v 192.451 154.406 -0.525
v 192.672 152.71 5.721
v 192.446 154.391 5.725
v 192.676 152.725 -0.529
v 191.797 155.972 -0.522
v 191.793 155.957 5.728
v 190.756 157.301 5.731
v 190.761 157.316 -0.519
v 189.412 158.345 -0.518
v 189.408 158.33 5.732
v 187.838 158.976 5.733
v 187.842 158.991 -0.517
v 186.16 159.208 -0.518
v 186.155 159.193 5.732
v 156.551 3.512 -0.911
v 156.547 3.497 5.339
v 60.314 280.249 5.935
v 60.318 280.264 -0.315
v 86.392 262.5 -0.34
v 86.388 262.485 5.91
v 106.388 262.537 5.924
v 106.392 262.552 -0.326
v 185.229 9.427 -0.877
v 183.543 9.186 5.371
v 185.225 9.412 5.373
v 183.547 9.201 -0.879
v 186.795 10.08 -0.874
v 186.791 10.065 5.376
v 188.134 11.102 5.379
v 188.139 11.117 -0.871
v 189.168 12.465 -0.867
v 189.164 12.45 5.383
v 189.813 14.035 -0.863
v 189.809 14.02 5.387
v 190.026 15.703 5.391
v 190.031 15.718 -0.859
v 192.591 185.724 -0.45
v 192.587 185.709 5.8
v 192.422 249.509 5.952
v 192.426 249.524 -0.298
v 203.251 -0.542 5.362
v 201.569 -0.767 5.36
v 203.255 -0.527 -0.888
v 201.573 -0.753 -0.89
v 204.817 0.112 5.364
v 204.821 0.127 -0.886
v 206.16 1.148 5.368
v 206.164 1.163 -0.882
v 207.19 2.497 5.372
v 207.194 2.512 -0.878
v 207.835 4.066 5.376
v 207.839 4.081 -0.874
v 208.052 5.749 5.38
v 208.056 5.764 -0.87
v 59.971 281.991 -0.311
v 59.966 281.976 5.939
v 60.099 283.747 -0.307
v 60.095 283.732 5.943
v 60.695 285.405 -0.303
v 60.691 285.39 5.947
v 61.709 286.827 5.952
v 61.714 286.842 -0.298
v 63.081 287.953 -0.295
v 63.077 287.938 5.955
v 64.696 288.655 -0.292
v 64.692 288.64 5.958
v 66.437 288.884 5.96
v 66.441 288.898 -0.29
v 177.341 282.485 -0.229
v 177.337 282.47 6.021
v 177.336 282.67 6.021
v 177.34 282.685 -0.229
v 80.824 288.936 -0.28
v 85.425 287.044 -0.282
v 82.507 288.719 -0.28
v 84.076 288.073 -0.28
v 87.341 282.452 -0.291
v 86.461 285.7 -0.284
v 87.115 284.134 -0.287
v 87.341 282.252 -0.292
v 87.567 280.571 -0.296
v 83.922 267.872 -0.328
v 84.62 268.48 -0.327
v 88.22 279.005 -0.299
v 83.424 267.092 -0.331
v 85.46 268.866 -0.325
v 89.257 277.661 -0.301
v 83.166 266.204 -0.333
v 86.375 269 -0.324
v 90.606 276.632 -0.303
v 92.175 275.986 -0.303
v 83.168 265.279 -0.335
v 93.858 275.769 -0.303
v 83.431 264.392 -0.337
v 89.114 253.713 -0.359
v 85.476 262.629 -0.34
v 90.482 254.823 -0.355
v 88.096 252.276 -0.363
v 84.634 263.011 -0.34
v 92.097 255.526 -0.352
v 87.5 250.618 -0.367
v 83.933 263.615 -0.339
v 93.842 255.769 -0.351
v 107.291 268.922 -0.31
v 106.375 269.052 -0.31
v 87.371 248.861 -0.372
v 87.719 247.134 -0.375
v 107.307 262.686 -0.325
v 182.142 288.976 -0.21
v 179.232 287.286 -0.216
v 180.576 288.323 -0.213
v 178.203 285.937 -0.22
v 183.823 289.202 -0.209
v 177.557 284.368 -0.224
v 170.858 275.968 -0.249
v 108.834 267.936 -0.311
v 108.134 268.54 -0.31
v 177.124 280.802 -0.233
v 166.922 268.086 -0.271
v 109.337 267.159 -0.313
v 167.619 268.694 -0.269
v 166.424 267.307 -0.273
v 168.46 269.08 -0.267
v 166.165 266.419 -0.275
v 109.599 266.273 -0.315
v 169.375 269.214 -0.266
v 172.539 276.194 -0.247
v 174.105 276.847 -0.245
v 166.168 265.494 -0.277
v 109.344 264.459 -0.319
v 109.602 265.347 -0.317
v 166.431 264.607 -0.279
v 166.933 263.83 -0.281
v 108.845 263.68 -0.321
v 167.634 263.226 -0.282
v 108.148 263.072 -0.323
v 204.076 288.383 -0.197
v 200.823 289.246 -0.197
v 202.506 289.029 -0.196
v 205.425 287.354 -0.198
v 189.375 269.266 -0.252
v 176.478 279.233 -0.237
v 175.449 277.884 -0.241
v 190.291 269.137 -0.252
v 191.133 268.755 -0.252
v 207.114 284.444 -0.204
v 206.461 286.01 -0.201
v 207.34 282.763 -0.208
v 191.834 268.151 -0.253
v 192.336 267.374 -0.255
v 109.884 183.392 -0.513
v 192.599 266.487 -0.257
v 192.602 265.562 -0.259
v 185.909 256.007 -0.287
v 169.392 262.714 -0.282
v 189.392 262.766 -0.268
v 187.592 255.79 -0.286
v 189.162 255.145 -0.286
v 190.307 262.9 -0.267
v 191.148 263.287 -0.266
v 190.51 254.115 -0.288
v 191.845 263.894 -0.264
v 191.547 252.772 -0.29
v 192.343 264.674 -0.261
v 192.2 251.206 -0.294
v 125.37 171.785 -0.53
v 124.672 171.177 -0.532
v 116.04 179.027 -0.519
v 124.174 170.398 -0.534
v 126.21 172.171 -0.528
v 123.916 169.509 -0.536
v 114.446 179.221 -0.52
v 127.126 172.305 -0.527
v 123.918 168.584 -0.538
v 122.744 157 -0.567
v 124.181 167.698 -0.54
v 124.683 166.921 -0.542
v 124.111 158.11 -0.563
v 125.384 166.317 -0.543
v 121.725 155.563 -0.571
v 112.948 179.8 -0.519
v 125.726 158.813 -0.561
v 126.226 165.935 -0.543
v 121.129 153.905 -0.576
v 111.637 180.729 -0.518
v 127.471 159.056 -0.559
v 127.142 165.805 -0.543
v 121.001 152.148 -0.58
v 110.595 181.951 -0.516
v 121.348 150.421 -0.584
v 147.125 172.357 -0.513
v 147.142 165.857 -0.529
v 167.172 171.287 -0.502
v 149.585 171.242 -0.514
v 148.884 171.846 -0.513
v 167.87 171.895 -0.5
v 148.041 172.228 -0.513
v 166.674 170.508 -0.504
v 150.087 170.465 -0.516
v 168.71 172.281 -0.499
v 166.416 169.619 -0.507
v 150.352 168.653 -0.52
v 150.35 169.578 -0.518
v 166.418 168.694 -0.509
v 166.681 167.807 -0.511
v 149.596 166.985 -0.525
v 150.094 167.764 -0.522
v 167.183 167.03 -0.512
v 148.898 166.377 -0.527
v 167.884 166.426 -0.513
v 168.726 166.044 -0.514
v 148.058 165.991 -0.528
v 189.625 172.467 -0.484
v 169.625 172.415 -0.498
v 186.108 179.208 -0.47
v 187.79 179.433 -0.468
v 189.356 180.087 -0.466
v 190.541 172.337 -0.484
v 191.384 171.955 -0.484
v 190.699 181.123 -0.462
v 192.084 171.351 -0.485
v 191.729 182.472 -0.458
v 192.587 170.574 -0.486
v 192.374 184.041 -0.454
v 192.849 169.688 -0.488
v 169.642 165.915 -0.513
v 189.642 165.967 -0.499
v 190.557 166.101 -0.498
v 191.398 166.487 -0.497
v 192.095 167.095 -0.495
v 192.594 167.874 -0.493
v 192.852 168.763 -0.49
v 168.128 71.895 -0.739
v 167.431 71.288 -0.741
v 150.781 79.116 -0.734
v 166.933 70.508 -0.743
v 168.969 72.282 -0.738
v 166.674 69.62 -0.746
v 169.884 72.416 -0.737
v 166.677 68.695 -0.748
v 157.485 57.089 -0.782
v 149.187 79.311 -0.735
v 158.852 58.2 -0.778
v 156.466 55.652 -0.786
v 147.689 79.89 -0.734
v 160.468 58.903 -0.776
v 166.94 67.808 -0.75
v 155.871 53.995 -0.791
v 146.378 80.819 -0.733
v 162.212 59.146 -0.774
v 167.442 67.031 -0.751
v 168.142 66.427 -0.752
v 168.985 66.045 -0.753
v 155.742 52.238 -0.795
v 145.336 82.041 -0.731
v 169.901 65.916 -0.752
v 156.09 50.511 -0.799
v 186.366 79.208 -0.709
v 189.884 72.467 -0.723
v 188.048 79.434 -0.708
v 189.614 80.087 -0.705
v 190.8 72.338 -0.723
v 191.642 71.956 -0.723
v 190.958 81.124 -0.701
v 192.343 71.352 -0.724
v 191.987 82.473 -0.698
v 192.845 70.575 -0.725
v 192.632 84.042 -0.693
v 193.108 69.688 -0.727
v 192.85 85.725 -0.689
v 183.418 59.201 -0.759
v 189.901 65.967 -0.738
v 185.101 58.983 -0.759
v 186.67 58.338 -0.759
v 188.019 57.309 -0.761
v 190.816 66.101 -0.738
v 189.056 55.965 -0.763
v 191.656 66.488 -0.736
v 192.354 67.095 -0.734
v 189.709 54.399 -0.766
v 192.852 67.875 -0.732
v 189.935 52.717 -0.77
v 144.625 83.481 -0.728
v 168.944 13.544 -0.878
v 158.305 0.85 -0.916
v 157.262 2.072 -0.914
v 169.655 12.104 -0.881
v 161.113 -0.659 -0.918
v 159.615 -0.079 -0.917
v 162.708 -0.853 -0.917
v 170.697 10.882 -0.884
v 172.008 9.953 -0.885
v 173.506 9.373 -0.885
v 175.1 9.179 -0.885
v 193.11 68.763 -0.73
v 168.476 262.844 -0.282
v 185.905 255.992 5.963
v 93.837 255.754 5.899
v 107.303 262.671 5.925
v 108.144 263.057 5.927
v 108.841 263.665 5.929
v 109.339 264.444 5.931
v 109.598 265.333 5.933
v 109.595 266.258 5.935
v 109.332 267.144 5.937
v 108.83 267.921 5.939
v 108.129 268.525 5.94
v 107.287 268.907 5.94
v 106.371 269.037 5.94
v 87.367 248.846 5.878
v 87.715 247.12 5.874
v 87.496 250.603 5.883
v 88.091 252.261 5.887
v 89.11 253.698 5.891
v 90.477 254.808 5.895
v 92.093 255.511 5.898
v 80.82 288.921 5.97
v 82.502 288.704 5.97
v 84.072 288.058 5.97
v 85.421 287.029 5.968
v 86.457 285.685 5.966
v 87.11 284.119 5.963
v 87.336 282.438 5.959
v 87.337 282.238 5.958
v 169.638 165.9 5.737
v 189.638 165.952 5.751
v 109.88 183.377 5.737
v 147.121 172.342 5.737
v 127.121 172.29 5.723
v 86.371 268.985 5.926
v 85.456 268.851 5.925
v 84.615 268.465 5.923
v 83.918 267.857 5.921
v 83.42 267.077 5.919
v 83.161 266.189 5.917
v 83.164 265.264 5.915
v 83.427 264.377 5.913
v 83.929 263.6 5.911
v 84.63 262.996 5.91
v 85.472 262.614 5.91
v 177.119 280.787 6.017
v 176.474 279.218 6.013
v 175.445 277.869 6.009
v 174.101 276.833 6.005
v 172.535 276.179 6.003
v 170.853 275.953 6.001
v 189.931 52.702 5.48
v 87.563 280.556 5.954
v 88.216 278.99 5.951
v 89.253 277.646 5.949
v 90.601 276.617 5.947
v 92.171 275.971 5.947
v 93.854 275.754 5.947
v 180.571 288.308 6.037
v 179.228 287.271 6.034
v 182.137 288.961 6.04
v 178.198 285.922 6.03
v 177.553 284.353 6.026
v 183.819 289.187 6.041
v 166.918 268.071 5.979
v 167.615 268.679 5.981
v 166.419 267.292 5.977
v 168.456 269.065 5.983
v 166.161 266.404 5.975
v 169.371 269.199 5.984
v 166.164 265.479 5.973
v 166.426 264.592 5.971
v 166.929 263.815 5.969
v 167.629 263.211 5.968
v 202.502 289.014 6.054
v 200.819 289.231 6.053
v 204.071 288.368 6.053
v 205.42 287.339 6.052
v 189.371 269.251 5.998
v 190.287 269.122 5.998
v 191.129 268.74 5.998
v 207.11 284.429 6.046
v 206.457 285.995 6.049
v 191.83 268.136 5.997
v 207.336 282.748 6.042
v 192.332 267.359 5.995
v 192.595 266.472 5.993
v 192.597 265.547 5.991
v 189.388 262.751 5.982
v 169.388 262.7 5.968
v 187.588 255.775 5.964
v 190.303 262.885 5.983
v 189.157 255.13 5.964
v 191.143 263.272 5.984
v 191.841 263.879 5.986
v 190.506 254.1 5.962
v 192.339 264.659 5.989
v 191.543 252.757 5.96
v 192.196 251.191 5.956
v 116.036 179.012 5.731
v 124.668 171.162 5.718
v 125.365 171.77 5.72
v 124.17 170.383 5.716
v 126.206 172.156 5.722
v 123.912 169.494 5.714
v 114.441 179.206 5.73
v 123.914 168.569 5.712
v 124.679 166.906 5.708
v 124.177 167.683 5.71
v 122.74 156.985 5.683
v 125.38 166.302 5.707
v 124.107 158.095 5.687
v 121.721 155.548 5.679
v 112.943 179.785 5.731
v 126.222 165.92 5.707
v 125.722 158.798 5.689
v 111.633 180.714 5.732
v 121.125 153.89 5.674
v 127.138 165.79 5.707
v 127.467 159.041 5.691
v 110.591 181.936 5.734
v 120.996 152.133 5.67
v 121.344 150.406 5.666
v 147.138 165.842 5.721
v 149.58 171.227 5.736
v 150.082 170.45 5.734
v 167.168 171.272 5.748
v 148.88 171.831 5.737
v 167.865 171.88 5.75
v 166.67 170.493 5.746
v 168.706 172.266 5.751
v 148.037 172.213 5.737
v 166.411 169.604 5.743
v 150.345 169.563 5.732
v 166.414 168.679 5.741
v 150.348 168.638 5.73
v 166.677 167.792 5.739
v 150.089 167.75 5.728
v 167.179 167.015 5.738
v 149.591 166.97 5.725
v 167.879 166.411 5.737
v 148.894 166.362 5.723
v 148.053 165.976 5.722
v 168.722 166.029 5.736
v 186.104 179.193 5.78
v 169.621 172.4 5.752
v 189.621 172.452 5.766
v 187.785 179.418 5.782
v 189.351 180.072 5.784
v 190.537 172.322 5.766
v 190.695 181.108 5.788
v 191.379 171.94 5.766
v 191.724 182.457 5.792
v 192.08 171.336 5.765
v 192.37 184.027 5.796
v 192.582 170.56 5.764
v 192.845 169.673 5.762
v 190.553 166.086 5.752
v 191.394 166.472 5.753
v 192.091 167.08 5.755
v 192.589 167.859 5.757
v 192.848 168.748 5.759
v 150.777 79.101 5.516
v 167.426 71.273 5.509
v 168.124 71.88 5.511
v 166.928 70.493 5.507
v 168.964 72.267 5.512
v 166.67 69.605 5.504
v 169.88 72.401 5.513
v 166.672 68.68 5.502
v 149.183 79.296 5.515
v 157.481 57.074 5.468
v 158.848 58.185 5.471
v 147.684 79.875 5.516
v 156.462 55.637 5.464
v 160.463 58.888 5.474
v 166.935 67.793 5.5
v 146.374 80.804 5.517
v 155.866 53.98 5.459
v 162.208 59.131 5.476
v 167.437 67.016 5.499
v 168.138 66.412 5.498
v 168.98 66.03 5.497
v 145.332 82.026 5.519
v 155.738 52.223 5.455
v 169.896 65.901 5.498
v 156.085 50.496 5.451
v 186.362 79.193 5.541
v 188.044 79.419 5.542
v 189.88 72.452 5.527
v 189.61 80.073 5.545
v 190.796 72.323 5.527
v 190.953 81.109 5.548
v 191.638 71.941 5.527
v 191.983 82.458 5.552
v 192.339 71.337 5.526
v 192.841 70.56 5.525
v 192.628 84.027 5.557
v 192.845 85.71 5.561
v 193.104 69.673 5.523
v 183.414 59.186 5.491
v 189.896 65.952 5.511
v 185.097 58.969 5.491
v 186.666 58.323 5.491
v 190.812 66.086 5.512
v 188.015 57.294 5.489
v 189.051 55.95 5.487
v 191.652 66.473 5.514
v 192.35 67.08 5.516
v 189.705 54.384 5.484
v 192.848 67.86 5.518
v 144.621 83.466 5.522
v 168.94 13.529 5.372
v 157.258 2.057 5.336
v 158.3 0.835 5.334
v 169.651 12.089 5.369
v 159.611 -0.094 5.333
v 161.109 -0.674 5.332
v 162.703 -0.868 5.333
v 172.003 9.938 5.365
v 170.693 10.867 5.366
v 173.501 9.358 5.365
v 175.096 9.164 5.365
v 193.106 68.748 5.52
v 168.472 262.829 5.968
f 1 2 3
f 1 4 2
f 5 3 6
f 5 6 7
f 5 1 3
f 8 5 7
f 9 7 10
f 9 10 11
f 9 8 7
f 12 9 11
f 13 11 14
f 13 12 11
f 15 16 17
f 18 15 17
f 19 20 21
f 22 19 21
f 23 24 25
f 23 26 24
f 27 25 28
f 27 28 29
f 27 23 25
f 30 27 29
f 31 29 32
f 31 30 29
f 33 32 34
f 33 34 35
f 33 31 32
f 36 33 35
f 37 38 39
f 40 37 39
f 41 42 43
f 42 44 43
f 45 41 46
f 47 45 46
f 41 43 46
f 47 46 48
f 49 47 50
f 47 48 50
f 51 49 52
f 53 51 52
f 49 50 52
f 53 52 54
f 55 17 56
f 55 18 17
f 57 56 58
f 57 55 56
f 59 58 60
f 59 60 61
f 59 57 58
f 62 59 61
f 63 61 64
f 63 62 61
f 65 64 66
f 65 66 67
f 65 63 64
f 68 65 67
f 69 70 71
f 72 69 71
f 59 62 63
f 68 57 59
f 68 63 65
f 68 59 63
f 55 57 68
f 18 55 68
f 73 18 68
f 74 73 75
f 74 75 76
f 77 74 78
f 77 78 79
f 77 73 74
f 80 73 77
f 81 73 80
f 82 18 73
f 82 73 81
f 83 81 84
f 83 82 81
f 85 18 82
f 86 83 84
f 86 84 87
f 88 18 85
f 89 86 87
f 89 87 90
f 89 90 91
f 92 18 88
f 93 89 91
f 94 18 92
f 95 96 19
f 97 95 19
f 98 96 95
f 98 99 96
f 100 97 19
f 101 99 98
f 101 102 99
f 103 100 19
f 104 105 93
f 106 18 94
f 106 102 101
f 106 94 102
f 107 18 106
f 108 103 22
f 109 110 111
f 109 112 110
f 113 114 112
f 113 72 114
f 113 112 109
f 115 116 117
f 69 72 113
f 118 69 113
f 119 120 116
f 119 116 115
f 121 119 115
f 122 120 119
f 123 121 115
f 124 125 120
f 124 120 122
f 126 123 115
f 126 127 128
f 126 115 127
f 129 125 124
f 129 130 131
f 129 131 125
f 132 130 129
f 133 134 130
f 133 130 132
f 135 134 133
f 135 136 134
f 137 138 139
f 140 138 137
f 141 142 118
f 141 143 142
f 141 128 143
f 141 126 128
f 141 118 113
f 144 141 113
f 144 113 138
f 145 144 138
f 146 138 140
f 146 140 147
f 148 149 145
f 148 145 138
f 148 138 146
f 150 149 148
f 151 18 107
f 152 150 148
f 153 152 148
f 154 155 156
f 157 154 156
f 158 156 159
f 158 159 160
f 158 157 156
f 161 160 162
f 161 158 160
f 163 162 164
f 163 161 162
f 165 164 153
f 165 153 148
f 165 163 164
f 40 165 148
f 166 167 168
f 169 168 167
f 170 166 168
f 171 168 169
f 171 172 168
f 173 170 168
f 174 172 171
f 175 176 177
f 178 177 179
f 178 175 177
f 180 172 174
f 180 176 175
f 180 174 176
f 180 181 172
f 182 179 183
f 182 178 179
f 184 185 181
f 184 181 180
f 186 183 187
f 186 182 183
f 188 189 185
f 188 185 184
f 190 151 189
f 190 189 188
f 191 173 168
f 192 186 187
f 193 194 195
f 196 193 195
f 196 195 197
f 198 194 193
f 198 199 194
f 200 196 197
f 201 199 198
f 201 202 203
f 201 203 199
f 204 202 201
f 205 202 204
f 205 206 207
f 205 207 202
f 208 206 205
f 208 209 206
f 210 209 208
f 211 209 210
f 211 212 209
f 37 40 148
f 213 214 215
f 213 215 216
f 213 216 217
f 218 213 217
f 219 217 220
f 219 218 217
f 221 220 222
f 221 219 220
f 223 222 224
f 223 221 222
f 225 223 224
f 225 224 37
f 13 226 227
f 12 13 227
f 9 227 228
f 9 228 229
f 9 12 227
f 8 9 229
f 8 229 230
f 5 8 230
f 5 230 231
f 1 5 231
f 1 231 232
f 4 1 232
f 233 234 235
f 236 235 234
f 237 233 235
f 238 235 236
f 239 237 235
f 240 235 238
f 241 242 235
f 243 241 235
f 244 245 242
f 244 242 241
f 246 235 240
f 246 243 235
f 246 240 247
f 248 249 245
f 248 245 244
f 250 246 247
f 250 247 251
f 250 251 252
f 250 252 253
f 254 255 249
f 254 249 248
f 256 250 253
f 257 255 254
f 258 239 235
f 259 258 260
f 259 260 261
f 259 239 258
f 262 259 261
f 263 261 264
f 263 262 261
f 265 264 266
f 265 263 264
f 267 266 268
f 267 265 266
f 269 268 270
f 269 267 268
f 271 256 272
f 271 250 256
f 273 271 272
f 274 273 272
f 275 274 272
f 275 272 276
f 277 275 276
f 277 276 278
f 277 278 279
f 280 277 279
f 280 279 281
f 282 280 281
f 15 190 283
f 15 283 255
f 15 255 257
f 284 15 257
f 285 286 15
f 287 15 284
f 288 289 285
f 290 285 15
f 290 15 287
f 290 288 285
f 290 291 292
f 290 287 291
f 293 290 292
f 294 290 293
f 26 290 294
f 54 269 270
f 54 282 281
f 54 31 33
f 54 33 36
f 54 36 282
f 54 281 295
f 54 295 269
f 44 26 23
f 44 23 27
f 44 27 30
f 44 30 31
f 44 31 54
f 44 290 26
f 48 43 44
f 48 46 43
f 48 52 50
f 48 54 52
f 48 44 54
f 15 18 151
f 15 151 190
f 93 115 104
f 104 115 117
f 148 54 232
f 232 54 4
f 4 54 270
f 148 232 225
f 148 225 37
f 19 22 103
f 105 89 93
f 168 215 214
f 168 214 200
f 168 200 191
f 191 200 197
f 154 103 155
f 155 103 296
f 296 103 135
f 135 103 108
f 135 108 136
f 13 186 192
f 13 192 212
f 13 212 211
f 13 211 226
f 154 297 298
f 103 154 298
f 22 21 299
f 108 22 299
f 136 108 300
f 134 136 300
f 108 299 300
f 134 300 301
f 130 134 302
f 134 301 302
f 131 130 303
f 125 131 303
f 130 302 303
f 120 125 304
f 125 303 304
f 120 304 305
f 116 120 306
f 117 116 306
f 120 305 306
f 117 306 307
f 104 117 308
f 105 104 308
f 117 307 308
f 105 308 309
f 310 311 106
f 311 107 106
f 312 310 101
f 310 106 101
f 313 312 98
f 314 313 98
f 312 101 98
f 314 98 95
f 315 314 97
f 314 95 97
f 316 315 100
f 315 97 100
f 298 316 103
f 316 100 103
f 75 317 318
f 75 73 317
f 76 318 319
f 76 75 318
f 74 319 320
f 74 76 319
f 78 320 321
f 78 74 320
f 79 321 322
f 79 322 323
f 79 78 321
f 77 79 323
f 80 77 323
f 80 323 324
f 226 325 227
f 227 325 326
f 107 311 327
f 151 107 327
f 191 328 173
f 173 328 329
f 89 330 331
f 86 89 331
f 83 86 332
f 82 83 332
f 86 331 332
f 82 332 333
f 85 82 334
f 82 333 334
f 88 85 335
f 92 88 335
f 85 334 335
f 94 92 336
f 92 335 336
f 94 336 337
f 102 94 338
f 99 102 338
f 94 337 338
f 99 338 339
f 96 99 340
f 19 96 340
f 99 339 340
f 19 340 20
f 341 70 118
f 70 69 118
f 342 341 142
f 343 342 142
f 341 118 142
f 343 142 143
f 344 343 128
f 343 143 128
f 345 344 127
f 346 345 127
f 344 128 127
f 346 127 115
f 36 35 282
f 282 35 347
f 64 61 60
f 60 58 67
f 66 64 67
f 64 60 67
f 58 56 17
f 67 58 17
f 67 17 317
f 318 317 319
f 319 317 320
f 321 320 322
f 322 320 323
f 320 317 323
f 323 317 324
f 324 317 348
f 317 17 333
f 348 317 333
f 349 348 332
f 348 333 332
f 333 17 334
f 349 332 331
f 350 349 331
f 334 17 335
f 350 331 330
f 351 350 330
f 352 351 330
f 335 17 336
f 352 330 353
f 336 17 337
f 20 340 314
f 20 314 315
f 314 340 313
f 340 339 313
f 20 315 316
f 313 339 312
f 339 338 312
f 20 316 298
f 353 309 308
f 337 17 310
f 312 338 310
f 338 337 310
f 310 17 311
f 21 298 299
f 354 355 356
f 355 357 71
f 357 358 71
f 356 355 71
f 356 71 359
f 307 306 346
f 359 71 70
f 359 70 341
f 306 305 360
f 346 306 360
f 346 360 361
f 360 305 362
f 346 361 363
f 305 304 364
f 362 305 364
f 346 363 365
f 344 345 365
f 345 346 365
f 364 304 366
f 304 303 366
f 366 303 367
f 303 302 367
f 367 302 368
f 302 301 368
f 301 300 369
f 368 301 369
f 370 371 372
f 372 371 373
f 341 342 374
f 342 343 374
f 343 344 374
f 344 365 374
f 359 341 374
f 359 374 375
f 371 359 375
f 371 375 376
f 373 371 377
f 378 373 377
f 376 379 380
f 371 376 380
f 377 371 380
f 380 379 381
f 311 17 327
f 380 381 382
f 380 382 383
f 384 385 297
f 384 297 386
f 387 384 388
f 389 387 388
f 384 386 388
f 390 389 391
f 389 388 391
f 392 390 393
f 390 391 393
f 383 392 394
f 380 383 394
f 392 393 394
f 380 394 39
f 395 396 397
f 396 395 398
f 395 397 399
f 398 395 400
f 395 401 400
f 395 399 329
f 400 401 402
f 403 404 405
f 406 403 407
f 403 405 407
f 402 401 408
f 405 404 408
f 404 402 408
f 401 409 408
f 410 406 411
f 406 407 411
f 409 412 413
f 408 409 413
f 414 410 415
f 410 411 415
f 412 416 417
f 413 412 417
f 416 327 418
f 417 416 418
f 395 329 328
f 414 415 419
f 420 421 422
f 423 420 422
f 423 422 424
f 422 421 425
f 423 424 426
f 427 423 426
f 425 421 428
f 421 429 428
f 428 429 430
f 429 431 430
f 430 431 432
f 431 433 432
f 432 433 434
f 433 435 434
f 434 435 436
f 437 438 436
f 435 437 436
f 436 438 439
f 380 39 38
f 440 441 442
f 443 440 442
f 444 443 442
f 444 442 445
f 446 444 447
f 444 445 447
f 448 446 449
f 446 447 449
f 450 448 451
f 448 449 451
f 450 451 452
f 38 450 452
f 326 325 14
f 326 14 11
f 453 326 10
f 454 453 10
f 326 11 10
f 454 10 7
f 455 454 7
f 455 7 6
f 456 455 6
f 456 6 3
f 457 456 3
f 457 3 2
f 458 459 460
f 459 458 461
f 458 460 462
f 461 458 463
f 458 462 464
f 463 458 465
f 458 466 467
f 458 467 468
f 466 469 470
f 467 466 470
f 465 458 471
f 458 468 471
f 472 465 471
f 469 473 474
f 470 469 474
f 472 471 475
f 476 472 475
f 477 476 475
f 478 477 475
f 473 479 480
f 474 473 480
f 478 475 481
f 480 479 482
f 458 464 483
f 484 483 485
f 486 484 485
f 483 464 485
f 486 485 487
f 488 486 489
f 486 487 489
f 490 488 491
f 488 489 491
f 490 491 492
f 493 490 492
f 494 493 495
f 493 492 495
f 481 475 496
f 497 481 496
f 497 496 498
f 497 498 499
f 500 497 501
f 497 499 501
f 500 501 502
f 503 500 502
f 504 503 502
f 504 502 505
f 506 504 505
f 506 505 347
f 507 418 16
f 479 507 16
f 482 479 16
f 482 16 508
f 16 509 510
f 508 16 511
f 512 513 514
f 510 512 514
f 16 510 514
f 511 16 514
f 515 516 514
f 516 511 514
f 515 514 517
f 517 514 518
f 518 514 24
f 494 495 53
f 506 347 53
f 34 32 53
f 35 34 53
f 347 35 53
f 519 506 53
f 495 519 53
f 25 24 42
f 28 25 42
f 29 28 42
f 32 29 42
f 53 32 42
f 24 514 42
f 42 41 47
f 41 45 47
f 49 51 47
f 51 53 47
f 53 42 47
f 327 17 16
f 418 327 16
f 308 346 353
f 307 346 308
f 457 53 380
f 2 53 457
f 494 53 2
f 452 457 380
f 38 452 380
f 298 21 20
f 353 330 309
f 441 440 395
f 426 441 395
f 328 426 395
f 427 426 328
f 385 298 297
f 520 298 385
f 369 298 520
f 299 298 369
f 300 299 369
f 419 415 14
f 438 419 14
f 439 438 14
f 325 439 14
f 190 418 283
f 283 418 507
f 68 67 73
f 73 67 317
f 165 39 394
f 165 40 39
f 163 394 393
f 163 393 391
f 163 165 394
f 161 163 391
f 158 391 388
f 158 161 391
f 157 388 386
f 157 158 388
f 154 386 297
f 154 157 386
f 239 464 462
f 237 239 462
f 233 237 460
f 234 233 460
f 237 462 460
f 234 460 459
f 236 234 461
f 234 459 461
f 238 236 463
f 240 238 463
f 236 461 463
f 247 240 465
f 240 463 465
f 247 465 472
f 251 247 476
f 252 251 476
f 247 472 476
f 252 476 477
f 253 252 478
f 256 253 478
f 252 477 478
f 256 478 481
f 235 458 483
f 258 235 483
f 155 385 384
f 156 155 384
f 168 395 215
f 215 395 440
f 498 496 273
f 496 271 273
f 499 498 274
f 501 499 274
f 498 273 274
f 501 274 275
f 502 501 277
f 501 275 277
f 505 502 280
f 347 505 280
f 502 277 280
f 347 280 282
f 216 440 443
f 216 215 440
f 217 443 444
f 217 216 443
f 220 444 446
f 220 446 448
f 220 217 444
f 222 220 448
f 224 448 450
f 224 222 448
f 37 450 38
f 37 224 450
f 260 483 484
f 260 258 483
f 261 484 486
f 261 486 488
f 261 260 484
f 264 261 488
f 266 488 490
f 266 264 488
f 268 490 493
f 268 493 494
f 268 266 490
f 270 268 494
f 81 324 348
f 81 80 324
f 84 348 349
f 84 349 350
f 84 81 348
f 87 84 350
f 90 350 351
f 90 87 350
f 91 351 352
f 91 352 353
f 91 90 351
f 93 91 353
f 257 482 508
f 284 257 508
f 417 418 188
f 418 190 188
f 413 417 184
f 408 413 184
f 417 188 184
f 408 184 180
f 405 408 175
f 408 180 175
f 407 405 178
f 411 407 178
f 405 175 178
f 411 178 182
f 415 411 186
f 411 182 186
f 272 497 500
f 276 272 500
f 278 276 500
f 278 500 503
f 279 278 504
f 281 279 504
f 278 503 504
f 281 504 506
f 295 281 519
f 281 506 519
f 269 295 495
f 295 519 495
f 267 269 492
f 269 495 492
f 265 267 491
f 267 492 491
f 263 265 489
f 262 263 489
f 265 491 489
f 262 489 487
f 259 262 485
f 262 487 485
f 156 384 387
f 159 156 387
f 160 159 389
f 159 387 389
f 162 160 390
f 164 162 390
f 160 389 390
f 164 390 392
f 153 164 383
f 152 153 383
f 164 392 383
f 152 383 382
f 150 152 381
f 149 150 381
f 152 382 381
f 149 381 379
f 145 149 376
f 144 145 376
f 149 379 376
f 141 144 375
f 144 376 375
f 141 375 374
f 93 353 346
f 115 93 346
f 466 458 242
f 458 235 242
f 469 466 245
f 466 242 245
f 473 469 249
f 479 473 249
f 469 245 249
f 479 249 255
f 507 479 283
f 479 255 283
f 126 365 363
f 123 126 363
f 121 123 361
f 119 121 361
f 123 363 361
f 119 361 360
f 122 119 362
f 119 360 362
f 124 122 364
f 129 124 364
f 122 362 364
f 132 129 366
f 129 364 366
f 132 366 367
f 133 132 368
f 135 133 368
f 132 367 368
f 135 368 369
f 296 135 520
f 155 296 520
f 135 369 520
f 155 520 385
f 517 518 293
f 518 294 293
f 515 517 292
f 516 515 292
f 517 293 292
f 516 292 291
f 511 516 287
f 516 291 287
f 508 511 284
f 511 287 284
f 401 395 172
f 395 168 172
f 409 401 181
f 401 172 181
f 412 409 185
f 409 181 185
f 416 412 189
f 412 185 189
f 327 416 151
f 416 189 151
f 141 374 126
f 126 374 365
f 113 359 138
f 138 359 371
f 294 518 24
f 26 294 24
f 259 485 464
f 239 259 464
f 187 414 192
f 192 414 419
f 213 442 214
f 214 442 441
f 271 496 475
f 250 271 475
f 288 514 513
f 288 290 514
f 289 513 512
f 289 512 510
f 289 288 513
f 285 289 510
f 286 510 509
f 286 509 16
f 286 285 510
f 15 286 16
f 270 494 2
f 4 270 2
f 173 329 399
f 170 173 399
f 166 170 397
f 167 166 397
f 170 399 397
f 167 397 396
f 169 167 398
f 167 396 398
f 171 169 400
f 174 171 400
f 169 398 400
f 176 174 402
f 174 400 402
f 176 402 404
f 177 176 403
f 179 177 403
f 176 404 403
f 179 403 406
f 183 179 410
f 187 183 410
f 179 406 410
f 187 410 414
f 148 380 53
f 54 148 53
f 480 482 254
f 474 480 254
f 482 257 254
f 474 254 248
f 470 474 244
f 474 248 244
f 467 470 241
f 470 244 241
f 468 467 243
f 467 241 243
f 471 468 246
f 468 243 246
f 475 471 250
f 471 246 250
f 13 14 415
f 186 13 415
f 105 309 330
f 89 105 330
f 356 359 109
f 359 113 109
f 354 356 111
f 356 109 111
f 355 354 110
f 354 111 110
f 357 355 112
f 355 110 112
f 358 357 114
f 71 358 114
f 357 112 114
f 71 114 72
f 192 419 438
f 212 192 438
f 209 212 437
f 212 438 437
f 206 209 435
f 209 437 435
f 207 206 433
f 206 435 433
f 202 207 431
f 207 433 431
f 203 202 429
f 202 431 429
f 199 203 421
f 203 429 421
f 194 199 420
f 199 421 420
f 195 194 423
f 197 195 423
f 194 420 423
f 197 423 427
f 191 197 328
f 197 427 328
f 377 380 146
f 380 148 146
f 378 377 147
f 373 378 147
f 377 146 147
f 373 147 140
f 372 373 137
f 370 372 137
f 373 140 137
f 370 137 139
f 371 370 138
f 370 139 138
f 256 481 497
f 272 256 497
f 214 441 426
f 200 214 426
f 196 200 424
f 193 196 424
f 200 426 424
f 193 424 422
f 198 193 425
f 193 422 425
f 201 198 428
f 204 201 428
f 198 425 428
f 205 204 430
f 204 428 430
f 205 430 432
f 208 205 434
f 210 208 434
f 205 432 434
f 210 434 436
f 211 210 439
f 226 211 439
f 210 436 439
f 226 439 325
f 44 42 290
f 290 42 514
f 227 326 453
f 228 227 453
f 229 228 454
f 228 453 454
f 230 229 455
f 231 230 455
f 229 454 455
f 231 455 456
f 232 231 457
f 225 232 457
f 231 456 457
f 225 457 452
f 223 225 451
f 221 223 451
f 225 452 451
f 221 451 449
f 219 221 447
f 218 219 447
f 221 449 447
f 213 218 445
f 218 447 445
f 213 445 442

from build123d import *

# Parameters (mm, degrees)
PAD_DEPTH              = 6.25
FILLET_R               = 6.5
MIRROR_ROLL_ANGLE      = -179.860318
MIRROR_PITCH_ANGLE     = 1.669328
MIRROR_PLACEMENT_ANGLE = 0.337481


with BuildPart() as body:
    # Sketch → Pad (new body)
    with BuildSketch(Plane.XY):
        Polygon((0, 290), (50, 290), (150, 0), (120, 0), (120, 13.2), (30, 13.2), (30, 0), (0, 0), align=None)
        Polygon((15, 210), (15, 130), (89.30566, 130), (61.719453, 210), align=None, mode=Mode.SUBTRACT)
        Polygon((15, 110), (15, 33.2), (122.684971, 33.2), (96.202212, 110), align=None, mode=Mode.SUBTRACT)
        with BuildLine():
            ThreePointArc((18, 223.25), (14.75, 220), (18, 216.75))
            Line((18, 216.75), (38, 216.75))
            ThreePointArc((38, 216.75), (41.25, 220), (38, 223.25))
            Line((38, 223.25), (18, 223.25))
        make_face(mode=Mode.SUBTRACT)
        with BuildLine():
            ThreePointArc((60.5, 123.25), (57.25, 120), (60.5, 116.75))
            Line((60.5, 116.75), (80.5, 116.75))
            ThreePointArc((80.5, 116.75), (83.75, 120), (80.5, 123.25))
            Line((80.5, 123.25), (60.5, 123.25))
        make_face(mode=Mode.SUBTRACT)
        with BuildLine():
            ThreePointArc((18, 123.25), (14.75, 120), (18, 116.75))
            Line((18, 116.75), (38, 116.75))
            ThreePointArc((38, 116.75), (41.25, 120), (38, 123.25))
            Line((38, 123.25), (18, 123.25))
        make_face(mode=Mode.SUBTRACT)
        with BuildLine():
            ThreePointArc((18, 26.45), (14.75, 23.2), (18, 19.95))
            Line((18, 19.95), (38, 19.95))
            ThreePointArc((38, 19.95), (41.25, 23.2), (38, 26.45))
            Line((38, 26.45), (18, 26.45))
        make_face(mode=Mode.SUBTRACT)
        with BuildLine():
            ThreePointArc((101, 26.45), (97.75, 23.2), (101, 19.95))
            Line((101, 19.95), (121, 19.95))
            ThreePointArc((121, 19.95), (124.25, 23.2), (121, 26.45))
            Line((121, 26.45), (101, 26.45))
        make_face(mode=Mode.SUBTRACT)
        Polygon((18, 280), (18, 230), (54.822902, 230), (37.581522, 280), align=None, mode=Mode.SUBTRACT)
    extrude(amount=PAD_DEPTH)

    # Fillet
    fillet_edges = [body.edges().sort_by_distance(p)[0] for p in [
        (0, 0, 3.125),
        (50, 290, 3.125),
        (0, 290, 3.125),
        (150, 0, 3.125),
        (120, 0, 3.125),
        (30, 0, 3.125),
        (61.719453, 210, 3.125),
        (15, 210, 3.125),
        (96.202212, 110, 3.125),
        (15, 110, 3.125),
        (15, 130, 3.125),
        (15, 33.2, 3.125),
        (122.684971, 33.2, 3.125),
        (89.30566, 130, 3.125),
        (30, 13.2, 3.125),
        (120, 13.2, 3.125),
        (18, 280, 3.125),
        (18, 230, 3.125),
        (37.581522, 280, 3.125),
        (54.822902, 230, 3.125),
    ]]
    fillet(fillet_edges, radius=FILLET_R)


with BuildPart() as body_1:
    # Body placement: moved
    add(body.part.moved(Location((-2, 0, 0))))


with BuildPart() as model_body_mirrored:
    # mirror: instance of Body
    add(body_1.part.mirror(Plane(origin=(159.181488, 124.226166, 5.790833), x_dir=(-0.001618, 0.999999, 0), z_dir=(-0.999887, -0.001617, 0.014919))))


with BuildPart() as model_body_mirrored_1:
    # mirror roll: moved
    add(model_body_mirrored.part.rotate(Axis((0, 0, 0), (1, 0, 0)), MIRROR_ROLL_ANGLE))


with BuildPart() as model_body_mirrored_2:
    # mirror pitch: moved
    add(model_body_mirrored_1.part.rotate(Axis((0, 0, 0), (0, 1, 0)), MIRROR_PITCH_ANGLE))


with BuildPart() as model_body_mirrored_3:
    # mirror placement: moved
    add(model_body_mirrored_2.part.moved(Location((-113.201923, 287.892908, 10.586))).rotate(Axis((-113.201923, 287.892908, 10.586), (0, 0, 1)), MIRROR_PLACEMENT_ANGLE))


solid = model_body_mirrored_3.part
